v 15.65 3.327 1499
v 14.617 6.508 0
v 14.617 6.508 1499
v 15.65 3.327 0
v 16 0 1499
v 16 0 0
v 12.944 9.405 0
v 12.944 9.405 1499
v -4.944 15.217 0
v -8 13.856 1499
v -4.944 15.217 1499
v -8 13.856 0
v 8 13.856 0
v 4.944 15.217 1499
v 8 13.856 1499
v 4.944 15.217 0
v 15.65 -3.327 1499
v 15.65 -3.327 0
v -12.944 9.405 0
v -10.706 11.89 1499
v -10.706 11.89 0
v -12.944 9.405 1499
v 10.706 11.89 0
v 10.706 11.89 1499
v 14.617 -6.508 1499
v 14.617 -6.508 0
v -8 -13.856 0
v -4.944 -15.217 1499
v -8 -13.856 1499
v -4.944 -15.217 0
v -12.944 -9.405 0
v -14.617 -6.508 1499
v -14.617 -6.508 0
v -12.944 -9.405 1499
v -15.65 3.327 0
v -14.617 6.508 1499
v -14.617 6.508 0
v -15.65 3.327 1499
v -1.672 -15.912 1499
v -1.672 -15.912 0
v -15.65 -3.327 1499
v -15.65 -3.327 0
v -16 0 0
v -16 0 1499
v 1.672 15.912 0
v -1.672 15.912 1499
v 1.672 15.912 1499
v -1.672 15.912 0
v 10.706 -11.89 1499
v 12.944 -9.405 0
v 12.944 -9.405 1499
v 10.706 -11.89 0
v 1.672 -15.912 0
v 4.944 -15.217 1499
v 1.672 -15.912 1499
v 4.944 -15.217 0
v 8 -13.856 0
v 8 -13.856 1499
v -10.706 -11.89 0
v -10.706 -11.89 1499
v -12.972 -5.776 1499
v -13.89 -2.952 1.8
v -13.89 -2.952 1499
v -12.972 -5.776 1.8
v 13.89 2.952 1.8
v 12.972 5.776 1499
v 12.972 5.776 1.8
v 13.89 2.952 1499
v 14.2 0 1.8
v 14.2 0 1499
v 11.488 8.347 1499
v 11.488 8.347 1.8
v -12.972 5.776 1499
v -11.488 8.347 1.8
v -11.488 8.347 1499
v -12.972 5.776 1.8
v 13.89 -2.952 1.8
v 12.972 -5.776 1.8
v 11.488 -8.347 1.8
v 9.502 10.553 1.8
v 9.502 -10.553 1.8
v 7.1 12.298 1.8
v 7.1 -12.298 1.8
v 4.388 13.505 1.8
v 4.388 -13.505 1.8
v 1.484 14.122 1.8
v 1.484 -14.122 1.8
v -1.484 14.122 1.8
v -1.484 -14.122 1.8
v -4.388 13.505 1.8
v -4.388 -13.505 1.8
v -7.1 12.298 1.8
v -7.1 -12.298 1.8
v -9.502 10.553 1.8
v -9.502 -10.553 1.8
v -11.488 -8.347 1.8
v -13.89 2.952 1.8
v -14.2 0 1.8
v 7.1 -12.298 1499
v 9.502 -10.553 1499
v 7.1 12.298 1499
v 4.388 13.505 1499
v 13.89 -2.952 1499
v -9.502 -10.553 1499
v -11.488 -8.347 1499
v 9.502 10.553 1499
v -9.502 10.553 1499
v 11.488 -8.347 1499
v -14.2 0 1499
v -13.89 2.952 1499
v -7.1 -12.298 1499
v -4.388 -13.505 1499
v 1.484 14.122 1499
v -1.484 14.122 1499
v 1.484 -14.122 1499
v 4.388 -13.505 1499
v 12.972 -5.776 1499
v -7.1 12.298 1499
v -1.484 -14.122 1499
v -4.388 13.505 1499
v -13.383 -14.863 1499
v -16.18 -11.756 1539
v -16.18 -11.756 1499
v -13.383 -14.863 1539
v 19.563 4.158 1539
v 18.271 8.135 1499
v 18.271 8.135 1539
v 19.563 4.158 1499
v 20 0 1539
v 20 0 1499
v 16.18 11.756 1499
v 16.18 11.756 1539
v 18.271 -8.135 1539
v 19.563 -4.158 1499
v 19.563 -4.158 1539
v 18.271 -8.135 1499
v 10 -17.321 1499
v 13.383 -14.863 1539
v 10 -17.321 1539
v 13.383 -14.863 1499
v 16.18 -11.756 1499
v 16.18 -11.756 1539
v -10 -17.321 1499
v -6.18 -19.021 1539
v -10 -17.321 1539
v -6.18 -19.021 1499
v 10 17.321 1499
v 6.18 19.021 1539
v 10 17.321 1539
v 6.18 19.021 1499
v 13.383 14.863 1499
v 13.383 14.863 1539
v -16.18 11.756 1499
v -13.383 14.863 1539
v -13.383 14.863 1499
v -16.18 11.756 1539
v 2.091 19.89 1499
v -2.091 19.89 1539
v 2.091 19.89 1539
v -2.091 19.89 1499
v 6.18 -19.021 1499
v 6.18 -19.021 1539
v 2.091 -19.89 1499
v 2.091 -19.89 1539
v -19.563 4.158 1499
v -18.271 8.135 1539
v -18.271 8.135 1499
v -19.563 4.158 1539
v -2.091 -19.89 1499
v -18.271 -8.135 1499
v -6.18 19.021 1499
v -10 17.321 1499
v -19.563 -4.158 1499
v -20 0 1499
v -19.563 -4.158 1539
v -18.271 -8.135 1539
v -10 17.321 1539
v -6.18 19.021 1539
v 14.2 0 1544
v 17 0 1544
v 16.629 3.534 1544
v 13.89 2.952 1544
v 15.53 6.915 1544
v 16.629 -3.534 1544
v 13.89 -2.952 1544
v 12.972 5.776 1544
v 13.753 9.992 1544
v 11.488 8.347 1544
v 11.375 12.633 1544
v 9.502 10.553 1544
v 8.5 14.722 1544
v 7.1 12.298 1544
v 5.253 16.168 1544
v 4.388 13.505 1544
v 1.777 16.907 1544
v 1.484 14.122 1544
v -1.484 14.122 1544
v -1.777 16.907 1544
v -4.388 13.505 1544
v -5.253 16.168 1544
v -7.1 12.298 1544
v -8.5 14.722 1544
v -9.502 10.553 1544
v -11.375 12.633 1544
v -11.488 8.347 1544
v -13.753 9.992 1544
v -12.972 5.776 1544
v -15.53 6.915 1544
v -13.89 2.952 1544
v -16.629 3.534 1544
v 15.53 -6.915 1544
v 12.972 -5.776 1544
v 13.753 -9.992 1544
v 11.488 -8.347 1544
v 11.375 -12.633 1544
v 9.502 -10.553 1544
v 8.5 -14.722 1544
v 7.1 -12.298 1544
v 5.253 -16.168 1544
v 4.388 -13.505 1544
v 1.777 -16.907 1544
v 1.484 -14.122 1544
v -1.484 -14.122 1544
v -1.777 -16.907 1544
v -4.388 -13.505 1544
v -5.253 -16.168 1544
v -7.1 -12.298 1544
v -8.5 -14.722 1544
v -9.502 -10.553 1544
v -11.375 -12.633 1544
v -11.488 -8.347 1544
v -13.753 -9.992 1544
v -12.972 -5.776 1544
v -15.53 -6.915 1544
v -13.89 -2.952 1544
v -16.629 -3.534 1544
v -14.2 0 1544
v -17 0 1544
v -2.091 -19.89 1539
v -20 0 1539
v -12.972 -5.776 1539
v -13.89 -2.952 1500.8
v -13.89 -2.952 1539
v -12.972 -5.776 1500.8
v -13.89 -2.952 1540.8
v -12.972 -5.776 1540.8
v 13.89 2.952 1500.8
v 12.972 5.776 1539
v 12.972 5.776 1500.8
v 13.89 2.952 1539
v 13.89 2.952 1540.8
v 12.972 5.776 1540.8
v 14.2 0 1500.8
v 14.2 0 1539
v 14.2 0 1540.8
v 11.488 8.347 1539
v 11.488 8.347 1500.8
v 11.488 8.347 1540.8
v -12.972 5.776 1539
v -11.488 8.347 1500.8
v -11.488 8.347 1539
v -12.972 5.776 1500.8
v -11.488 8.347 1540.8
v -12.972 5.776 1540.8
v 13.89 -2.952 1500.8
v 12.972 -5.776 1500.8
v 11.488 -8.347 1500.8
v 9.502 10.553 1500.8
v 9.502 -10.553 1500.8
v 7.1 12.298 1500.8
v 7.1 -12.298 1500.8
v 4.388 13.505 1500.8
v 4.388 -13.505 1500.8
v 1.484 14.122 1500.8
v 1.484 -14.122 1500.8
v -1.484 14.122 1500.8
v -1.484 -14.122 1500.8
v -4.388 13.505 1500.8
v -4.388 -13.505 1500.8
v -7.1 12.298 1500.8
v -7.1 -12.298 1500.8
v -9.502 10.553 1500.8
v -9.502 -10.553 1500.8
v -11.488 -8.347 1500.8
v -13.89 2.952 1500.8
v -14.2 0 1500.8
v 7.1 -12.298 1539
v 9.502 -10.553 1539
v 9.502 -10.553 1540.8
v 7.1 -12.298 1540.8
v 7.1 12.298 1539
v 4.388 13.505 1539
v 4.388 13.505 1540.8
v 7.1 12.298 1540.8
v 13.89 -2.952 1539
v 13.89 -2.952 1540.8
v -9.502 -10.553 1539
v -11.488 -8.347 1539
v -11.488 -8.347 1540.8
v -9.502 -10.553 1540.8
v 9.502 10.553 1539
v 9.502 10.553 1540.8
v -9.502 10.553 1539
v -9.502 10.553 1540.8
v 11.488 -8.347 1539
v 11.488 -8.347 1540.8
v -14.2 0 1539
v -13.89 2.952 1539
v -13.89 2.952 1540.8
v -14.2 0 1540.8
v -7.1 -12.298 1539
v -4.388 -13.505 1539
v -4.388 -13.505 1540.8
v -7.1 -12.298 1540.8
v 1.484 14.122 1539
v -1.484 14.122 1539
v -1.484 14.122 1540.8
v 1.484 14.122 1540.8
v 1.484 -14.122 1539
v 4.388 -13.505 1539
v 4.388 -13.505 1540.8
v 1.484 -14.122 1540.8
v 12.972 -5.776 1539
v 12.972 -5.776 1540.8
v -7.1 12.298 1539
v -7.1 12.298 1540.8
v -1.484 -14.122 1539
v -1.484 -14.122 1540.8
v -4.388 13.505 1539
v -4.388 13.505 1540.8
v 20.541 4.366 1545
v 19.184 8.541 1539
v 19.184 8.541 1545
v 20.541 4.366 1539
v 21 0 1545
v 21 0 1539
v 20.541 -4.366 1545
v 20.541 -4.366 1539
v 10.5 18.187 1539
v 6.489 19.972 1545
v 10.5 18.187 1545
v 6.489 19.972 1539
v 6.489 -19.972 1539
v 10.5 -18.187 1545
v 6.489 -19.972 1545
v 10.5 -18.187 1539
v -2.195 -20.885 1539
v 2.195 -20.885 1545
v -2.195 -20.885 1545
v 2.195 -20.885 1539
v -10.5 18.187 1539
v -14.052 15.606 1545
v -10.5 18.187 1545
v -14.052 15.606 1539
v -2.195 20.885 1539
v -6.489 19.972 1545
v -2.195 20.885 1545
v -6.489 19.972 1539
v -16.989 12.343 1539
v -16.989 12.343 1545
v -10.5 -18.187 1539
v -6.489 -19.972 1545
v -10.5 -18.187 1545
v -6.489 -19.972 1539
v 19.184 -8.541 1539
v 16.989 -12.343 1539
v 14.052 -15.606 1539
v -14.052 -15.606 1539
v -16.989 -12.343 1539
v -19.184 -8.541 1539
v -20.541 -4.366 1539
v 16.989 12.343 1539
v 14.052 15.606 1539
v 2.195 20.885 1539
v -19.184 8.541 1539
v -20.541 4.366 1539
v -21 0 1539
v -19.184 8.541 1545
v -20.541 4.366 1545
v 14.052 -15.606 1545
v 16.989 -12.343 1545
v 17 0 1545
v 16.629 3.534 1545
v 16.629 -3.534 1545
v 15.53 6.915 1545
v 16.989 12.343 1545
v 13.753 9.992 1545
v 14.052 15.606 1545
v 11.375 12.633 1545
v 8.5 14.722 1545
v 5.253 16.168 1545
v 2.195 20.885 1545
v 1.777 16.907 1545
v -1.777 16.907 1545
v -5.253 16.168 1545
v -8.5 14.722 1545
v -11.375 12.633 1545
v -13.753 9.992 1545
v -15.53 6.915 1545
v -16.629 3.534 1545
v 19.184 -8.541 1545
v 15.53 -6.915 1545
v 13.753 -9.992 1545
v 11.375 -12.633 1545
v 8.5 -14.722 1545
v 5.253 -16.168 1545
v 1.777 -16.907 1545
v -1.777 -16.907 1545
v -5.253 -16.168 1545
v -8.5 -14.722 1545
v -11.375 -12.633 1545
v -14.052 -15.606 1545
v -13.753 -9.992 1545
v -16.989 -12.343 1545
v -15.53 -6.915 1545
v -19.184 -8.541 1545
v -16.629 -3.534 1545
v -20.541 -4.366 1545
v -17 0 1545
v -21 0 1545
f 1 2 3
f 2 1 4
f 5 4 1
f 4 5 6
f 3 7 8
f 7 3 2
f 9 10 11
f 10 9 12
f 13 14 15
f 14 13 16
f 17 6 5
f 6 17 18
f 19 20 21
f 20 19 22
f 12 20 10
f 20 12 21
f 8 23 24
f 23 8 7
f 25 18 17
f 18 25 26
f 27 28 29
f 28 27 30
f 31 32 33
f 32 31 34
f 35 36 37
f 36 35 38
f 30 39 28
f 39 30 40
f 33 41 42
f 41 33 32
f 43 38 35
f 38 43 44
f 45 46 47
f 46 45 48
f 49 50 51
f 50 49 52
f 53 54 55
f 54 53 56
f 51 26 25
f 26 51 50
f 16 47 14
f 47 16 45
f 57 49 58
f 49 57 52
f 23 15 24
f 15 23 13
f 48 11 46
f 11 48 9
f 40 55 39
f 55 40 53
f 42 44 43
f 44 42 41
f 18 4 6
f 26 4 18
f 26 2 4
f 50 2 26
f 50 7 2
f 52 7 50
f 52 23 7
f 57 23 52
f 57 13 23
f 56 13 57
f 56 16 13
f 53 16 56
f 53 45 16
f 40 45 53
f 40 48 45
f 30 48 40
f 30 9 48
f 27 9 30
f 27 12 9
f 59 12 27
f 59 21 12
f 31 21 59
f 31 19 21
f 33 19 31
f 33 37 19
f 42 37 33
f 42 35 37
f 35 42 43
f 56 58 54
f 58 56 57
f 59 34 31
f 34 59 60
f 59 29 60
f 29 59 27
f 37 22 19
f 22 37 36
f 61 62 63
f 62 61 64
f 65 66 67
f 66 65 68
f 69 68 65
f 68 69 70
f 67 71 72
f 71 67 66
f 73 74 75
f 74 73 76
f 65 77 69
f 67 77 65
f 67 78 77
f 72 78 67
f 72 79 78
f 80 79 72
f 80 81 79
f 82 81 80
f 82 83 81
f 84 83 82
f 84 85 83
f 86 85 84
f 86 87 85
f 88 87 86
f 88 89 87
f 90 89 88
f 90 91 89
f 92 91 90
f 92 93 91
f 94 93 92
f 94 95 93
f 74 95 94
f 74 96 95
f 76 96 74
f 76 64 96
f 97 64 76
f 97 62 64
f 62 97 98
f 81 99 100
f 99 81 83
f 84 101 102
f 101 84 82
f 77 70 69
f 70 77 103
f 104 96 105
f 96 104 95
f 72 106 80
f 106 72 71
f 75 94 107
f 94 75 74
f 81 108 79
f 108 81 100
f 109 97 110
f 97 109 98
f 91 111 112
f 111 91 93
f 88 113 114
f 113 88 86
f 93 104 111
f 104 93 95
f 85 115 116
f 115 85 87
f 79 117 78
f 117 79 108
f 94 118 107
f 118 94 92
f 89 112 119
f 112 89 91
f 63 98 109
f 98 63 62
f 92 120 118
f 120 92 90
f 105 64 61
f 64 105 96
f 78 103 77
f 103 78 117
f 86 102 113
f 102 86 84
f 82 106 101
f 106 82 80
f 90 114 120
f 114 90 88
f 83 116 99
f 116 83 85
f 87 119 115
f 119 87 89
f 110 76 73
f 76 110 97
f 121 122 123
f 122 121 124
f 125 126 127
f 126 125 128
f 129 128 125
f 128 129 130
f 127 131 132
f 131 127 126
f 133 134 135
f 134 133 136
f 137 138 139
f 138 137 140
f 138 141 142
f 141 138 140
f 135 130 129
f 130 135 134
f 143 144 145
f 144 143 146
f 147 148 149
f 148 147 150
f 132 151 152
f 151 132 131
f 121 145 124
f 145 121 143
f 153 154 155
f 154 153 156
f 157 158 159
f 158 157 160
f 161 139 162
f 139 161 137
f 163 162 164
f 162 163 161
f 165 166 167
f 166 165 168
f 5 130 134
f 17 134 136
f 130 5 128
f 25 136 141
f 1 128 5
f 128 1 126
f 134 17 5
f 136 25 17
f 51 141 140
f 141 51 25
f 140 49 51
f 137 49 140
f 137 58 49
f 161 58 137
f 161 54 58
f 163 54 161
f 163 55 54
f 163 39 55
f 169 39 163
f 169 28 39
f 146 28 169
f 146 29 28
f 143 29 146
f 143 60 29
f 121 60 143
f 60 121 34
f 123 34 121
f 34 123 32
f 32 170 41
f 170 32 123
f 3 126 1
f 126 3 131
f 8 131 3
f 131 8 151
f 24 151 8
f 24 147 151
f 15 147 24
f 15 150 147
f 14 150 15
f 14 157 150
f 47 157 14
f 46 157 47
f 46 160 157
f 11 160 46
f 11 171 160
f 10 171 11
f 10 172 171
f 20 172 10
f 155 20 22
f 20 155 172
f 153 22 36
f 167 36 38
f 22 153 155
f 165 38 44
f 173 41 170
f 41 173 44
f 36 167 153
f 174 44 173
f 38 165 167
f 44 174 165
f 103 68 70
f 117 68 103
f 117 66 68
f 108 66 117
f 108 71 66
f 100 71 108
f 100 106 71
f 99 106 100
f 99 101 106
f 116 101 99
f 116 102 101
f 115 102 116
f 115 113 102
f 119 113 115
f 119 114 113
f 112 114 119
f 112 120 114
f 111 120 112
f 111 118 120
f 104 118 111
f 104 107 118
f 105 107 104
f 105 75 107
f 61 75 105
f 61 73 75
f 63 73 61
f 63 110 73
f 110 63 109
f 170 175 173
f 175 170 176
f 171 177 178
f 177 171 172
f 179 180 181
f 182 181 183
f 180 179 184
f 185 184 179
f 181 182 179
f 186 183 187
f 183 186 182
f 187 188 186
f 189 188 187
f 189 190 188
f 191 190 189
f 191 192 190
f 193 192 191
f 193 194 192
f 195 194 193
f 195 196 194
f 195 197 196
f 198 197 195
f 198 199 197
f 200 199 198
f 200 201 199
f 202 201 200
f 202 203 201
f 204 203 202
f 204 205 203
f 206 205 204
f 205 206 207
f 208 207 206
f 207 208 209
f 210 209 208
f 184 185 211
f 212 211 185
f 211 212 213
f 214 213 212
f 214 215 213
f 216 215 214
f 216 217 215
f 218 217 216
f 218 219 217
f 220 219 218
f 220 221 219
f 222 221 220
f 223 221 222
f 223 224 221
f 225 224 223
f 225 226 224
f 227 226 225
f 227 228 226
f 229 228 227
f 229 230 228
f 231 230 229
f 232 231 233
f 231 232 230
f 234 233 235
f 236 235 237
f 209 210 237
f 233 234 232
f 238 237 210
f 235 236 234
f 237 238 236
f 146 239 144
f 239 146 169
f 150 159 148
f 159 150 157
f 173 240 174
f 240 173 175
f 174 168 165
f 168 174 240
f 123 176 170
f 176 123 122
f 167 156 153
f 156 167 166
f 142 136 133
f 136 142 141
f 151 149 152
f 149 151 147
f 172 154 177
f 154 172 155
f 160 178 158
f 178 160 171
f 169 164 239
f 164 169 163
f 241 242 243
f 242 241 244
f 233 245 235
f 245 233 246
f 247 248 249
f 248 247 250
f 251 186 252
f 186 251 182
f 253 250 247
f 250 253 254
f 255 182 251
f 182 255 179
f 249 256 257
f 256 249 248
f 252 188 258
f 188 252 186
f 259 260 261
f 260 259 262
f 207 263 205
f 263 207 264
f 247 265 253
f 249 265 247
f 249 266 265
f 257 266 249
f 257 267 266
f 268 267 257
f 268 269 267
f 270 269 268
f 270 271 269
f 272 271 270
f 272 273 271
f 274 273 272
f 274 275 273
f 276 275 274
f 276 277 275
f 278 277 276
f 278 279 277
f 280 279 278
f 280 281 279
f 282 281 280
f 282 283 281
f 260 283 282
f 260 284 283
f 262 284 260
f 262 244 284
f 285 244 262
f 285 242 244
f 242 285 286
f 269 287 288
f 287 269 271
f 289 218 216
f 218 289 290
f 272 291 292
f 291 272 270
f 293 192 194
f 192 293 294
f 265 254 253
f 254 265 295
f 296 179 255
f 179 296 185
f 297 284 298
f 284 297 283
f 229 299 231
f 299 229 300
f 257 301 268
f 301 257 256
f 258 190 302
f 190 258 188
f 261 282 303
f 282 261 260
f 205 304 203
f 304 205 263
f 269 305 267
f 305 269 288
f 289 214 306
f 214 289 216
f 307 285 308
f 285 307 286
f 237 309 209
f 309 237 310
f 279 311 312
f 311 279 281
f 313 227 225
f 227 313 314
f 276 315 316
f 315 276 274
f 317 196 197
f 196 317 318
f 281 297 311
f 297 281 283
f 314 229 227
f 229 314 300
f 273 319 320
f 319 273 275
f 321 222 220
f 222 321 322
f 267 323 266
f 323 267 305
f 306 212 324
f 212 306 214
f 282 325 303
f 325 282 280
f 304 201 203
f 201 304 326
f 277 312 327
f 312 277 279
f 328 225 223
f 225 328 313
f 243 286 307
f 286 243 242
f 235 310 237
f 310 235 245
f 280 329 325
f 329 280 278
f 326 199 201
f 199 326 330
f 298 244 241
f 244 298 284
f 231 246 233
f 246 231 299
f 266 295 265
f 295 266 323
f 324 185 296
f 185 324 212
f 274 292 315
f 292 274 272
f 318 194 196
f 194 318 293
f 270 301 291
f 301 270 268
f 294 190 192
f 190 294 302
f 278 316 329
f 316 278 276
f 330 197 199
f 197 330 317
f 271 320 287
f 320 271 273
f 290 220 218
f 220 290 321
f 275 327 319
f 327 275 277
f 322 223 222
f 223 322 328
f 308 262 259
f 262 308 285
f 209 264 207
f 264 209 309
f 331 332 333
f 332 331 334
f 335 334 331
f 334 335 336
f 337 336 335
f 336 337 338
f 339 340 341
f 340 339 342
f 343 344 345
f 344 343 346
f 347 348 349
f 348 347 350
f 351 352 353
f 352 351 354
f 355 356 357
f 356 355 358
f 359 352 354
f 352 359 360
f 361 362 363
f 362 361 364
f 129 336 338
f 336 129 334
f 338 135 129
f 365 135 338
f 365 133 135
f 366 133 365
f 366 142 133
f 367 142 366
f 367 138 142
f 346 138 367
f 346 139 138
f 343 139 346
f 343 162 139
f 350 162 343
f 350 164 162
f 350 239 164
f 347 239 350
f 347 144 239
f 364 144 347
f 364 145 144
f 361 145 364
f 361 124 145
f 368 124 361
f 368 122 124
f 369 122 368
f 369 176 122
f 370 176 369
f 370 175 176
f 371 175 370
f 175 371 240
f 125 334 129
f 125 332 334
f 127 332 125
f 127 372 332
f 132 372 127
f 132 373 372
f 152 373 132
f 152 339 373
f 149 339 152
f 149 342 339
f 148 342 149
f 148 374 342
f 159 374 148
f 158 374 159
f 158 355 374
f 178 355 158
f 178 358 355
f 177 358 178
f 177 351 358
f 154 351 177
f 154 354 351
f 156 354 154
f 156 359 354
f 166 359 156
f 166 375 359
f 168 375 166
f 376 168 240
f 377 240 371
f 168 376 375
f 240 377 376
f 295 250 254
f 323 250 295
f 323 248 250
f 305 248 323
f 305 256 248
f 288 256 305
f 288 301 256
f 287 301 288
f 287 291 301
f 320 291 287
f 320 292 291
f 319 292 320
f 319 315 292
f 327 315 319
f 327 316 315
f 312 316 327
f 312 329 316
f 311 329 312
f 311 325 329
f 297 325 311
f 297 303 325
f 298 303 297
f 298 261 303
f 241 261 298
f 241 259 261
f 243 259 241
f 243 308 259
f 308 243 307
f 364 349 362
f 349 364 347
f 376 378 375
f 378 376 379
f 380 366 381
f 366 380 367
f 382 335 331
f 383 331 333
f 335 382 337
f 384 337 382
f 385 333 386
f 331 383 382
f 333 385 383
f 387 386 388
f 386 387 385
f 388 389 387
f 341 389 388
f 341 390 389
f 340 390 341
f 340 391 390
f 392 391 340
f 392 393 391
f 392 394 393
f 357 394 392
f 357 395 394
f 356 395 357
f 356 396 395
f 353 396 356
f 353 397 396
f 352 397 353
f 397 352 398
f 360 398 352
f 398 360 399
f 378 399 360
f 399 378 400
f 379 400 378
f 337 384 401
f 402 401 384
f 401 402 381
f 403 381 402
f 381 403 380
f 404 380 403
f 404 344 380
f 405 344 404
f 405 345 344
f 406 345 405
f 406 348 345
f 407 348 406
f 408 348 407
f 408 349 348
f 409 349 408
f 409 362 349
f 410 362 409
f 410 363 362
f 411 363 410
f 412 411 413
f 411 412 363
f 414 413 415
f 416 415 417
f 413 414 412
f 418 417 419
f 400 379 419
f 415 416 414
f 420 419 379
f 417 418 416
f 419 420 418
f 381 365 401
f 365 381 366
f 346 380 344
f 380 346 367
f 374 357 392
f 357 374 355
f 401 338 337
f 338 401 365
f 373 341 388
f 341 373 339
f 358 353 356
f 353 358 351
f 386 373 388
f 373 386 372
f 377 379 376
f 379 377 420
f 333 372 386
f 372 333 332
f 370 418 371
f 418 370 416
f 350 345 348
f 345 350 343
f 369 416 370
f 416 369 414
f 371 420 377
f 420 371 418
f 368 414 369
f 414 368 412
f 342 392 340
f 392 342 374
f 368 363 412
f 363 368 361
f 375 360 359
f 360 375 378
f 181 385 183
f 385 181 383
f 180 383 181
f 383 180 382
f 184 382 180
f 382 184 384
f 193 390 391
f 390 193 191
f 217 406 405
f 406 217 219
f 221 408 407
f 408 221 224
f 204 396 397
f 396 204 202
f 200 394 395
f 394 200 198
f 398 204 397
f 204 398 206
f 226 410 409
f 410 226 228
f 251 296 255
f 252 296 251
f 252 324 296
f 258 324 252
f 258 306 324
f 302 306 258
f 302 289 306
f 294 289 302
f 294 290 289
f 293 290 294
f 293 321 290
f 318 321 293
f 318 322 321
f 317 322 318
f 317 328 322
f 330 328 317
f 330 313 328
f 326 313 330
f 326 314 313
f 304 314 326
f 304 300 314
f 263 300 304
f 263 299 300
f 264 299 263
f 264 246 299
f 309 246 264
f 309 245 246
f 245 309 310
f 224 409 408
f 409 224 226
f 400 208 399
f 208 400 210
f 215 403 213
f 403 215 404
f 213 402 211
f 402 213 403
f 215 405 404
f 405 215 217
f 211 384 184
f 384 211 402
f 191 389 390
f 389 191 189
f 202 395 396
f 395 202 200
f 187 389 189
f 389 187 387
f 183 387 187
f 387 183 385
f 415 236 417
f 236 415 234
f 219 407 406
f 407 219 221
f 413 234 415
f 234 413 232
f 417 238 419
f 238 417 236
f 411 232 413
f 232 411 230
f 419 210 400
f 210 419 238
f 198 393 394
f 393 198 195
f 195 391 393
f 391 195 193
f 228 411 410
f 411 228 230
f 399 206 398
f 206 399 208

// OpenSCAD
// Parameters
pipe_standard = 1; //[1:1:1]
nominal_diameter = 32; //[16:64:1]
length_mm = 1500; //[750:3000:10]
include_end_fitting = 1; //[0:1:1]
ht32_outer_diameter = 32; //[28:40:1]
ht32_wall_thickness = 1.8; //[1:3.6:0.1]
fitting_length = 45; //[25:90:1]
fitting_outer_diameter = 40; //[34:60:1]
fitting_wall_extra = 1.2; //[0.5:3:0.1]
fitting_stop_ring_length = 6; //[2:15:1]
fitting_stop_ring_od_extra = 2; //[0.5:6:0.5]
overlap_mm = 1; //[0.5:2:0.1]

// HT Pipe - complete geometry
module ht_pipe() {
  color([0.85, 0.85, 0.8]) {
    // Pipe body
    difference() {
      cylinder(h=length_mm, r=ht32_outer_diameter/2, center=false);
      translate([0, 0, ht32_wall_thickness])
        cylinder(h=length_mm, r=ht32_outer_diameter/2 - ht32_wall_thickness, center=false);
    }
    
    if (include_end_fitting) {
      // End fitting
      difference() {
        translate([0, 0, length_mm - overlap_mm])
          cylinder(h=fitting_length, r=fitting_outer_diameter/2, center=false);
        translate([0, 0, length_mm - overlap_mm + ht32_wall_thickness])
          cylinder(h=fitting_length + overlap_mm, r=ht32_outer_diameter/2 - ht32_wall_thickness, center=false);
      }
      
      // Stop ring
      difference() {
        translate([0, 0, length_mm + fitting_length - fitting_stop_ring_length])
          cylinder(h=fitting_stop_ring_length, r=(fitting_outer_diameter + fitting_stop_ring_od_extra)/2, center=false);
        translate([0, 0, length_mm + fitting_length - fitting_stop_ring_length + ht32_wall_thickness])
          cylinder(h=fitting_stop_ring_length + overlap_mm, r=fitting_outer_diameter/2 - (ht32_wall_thickness + fitting_wall_extra), center=false);
      }
    }
  }
}

// Assembly
module assembly() {
  ht_pipe();
}

assembly();
